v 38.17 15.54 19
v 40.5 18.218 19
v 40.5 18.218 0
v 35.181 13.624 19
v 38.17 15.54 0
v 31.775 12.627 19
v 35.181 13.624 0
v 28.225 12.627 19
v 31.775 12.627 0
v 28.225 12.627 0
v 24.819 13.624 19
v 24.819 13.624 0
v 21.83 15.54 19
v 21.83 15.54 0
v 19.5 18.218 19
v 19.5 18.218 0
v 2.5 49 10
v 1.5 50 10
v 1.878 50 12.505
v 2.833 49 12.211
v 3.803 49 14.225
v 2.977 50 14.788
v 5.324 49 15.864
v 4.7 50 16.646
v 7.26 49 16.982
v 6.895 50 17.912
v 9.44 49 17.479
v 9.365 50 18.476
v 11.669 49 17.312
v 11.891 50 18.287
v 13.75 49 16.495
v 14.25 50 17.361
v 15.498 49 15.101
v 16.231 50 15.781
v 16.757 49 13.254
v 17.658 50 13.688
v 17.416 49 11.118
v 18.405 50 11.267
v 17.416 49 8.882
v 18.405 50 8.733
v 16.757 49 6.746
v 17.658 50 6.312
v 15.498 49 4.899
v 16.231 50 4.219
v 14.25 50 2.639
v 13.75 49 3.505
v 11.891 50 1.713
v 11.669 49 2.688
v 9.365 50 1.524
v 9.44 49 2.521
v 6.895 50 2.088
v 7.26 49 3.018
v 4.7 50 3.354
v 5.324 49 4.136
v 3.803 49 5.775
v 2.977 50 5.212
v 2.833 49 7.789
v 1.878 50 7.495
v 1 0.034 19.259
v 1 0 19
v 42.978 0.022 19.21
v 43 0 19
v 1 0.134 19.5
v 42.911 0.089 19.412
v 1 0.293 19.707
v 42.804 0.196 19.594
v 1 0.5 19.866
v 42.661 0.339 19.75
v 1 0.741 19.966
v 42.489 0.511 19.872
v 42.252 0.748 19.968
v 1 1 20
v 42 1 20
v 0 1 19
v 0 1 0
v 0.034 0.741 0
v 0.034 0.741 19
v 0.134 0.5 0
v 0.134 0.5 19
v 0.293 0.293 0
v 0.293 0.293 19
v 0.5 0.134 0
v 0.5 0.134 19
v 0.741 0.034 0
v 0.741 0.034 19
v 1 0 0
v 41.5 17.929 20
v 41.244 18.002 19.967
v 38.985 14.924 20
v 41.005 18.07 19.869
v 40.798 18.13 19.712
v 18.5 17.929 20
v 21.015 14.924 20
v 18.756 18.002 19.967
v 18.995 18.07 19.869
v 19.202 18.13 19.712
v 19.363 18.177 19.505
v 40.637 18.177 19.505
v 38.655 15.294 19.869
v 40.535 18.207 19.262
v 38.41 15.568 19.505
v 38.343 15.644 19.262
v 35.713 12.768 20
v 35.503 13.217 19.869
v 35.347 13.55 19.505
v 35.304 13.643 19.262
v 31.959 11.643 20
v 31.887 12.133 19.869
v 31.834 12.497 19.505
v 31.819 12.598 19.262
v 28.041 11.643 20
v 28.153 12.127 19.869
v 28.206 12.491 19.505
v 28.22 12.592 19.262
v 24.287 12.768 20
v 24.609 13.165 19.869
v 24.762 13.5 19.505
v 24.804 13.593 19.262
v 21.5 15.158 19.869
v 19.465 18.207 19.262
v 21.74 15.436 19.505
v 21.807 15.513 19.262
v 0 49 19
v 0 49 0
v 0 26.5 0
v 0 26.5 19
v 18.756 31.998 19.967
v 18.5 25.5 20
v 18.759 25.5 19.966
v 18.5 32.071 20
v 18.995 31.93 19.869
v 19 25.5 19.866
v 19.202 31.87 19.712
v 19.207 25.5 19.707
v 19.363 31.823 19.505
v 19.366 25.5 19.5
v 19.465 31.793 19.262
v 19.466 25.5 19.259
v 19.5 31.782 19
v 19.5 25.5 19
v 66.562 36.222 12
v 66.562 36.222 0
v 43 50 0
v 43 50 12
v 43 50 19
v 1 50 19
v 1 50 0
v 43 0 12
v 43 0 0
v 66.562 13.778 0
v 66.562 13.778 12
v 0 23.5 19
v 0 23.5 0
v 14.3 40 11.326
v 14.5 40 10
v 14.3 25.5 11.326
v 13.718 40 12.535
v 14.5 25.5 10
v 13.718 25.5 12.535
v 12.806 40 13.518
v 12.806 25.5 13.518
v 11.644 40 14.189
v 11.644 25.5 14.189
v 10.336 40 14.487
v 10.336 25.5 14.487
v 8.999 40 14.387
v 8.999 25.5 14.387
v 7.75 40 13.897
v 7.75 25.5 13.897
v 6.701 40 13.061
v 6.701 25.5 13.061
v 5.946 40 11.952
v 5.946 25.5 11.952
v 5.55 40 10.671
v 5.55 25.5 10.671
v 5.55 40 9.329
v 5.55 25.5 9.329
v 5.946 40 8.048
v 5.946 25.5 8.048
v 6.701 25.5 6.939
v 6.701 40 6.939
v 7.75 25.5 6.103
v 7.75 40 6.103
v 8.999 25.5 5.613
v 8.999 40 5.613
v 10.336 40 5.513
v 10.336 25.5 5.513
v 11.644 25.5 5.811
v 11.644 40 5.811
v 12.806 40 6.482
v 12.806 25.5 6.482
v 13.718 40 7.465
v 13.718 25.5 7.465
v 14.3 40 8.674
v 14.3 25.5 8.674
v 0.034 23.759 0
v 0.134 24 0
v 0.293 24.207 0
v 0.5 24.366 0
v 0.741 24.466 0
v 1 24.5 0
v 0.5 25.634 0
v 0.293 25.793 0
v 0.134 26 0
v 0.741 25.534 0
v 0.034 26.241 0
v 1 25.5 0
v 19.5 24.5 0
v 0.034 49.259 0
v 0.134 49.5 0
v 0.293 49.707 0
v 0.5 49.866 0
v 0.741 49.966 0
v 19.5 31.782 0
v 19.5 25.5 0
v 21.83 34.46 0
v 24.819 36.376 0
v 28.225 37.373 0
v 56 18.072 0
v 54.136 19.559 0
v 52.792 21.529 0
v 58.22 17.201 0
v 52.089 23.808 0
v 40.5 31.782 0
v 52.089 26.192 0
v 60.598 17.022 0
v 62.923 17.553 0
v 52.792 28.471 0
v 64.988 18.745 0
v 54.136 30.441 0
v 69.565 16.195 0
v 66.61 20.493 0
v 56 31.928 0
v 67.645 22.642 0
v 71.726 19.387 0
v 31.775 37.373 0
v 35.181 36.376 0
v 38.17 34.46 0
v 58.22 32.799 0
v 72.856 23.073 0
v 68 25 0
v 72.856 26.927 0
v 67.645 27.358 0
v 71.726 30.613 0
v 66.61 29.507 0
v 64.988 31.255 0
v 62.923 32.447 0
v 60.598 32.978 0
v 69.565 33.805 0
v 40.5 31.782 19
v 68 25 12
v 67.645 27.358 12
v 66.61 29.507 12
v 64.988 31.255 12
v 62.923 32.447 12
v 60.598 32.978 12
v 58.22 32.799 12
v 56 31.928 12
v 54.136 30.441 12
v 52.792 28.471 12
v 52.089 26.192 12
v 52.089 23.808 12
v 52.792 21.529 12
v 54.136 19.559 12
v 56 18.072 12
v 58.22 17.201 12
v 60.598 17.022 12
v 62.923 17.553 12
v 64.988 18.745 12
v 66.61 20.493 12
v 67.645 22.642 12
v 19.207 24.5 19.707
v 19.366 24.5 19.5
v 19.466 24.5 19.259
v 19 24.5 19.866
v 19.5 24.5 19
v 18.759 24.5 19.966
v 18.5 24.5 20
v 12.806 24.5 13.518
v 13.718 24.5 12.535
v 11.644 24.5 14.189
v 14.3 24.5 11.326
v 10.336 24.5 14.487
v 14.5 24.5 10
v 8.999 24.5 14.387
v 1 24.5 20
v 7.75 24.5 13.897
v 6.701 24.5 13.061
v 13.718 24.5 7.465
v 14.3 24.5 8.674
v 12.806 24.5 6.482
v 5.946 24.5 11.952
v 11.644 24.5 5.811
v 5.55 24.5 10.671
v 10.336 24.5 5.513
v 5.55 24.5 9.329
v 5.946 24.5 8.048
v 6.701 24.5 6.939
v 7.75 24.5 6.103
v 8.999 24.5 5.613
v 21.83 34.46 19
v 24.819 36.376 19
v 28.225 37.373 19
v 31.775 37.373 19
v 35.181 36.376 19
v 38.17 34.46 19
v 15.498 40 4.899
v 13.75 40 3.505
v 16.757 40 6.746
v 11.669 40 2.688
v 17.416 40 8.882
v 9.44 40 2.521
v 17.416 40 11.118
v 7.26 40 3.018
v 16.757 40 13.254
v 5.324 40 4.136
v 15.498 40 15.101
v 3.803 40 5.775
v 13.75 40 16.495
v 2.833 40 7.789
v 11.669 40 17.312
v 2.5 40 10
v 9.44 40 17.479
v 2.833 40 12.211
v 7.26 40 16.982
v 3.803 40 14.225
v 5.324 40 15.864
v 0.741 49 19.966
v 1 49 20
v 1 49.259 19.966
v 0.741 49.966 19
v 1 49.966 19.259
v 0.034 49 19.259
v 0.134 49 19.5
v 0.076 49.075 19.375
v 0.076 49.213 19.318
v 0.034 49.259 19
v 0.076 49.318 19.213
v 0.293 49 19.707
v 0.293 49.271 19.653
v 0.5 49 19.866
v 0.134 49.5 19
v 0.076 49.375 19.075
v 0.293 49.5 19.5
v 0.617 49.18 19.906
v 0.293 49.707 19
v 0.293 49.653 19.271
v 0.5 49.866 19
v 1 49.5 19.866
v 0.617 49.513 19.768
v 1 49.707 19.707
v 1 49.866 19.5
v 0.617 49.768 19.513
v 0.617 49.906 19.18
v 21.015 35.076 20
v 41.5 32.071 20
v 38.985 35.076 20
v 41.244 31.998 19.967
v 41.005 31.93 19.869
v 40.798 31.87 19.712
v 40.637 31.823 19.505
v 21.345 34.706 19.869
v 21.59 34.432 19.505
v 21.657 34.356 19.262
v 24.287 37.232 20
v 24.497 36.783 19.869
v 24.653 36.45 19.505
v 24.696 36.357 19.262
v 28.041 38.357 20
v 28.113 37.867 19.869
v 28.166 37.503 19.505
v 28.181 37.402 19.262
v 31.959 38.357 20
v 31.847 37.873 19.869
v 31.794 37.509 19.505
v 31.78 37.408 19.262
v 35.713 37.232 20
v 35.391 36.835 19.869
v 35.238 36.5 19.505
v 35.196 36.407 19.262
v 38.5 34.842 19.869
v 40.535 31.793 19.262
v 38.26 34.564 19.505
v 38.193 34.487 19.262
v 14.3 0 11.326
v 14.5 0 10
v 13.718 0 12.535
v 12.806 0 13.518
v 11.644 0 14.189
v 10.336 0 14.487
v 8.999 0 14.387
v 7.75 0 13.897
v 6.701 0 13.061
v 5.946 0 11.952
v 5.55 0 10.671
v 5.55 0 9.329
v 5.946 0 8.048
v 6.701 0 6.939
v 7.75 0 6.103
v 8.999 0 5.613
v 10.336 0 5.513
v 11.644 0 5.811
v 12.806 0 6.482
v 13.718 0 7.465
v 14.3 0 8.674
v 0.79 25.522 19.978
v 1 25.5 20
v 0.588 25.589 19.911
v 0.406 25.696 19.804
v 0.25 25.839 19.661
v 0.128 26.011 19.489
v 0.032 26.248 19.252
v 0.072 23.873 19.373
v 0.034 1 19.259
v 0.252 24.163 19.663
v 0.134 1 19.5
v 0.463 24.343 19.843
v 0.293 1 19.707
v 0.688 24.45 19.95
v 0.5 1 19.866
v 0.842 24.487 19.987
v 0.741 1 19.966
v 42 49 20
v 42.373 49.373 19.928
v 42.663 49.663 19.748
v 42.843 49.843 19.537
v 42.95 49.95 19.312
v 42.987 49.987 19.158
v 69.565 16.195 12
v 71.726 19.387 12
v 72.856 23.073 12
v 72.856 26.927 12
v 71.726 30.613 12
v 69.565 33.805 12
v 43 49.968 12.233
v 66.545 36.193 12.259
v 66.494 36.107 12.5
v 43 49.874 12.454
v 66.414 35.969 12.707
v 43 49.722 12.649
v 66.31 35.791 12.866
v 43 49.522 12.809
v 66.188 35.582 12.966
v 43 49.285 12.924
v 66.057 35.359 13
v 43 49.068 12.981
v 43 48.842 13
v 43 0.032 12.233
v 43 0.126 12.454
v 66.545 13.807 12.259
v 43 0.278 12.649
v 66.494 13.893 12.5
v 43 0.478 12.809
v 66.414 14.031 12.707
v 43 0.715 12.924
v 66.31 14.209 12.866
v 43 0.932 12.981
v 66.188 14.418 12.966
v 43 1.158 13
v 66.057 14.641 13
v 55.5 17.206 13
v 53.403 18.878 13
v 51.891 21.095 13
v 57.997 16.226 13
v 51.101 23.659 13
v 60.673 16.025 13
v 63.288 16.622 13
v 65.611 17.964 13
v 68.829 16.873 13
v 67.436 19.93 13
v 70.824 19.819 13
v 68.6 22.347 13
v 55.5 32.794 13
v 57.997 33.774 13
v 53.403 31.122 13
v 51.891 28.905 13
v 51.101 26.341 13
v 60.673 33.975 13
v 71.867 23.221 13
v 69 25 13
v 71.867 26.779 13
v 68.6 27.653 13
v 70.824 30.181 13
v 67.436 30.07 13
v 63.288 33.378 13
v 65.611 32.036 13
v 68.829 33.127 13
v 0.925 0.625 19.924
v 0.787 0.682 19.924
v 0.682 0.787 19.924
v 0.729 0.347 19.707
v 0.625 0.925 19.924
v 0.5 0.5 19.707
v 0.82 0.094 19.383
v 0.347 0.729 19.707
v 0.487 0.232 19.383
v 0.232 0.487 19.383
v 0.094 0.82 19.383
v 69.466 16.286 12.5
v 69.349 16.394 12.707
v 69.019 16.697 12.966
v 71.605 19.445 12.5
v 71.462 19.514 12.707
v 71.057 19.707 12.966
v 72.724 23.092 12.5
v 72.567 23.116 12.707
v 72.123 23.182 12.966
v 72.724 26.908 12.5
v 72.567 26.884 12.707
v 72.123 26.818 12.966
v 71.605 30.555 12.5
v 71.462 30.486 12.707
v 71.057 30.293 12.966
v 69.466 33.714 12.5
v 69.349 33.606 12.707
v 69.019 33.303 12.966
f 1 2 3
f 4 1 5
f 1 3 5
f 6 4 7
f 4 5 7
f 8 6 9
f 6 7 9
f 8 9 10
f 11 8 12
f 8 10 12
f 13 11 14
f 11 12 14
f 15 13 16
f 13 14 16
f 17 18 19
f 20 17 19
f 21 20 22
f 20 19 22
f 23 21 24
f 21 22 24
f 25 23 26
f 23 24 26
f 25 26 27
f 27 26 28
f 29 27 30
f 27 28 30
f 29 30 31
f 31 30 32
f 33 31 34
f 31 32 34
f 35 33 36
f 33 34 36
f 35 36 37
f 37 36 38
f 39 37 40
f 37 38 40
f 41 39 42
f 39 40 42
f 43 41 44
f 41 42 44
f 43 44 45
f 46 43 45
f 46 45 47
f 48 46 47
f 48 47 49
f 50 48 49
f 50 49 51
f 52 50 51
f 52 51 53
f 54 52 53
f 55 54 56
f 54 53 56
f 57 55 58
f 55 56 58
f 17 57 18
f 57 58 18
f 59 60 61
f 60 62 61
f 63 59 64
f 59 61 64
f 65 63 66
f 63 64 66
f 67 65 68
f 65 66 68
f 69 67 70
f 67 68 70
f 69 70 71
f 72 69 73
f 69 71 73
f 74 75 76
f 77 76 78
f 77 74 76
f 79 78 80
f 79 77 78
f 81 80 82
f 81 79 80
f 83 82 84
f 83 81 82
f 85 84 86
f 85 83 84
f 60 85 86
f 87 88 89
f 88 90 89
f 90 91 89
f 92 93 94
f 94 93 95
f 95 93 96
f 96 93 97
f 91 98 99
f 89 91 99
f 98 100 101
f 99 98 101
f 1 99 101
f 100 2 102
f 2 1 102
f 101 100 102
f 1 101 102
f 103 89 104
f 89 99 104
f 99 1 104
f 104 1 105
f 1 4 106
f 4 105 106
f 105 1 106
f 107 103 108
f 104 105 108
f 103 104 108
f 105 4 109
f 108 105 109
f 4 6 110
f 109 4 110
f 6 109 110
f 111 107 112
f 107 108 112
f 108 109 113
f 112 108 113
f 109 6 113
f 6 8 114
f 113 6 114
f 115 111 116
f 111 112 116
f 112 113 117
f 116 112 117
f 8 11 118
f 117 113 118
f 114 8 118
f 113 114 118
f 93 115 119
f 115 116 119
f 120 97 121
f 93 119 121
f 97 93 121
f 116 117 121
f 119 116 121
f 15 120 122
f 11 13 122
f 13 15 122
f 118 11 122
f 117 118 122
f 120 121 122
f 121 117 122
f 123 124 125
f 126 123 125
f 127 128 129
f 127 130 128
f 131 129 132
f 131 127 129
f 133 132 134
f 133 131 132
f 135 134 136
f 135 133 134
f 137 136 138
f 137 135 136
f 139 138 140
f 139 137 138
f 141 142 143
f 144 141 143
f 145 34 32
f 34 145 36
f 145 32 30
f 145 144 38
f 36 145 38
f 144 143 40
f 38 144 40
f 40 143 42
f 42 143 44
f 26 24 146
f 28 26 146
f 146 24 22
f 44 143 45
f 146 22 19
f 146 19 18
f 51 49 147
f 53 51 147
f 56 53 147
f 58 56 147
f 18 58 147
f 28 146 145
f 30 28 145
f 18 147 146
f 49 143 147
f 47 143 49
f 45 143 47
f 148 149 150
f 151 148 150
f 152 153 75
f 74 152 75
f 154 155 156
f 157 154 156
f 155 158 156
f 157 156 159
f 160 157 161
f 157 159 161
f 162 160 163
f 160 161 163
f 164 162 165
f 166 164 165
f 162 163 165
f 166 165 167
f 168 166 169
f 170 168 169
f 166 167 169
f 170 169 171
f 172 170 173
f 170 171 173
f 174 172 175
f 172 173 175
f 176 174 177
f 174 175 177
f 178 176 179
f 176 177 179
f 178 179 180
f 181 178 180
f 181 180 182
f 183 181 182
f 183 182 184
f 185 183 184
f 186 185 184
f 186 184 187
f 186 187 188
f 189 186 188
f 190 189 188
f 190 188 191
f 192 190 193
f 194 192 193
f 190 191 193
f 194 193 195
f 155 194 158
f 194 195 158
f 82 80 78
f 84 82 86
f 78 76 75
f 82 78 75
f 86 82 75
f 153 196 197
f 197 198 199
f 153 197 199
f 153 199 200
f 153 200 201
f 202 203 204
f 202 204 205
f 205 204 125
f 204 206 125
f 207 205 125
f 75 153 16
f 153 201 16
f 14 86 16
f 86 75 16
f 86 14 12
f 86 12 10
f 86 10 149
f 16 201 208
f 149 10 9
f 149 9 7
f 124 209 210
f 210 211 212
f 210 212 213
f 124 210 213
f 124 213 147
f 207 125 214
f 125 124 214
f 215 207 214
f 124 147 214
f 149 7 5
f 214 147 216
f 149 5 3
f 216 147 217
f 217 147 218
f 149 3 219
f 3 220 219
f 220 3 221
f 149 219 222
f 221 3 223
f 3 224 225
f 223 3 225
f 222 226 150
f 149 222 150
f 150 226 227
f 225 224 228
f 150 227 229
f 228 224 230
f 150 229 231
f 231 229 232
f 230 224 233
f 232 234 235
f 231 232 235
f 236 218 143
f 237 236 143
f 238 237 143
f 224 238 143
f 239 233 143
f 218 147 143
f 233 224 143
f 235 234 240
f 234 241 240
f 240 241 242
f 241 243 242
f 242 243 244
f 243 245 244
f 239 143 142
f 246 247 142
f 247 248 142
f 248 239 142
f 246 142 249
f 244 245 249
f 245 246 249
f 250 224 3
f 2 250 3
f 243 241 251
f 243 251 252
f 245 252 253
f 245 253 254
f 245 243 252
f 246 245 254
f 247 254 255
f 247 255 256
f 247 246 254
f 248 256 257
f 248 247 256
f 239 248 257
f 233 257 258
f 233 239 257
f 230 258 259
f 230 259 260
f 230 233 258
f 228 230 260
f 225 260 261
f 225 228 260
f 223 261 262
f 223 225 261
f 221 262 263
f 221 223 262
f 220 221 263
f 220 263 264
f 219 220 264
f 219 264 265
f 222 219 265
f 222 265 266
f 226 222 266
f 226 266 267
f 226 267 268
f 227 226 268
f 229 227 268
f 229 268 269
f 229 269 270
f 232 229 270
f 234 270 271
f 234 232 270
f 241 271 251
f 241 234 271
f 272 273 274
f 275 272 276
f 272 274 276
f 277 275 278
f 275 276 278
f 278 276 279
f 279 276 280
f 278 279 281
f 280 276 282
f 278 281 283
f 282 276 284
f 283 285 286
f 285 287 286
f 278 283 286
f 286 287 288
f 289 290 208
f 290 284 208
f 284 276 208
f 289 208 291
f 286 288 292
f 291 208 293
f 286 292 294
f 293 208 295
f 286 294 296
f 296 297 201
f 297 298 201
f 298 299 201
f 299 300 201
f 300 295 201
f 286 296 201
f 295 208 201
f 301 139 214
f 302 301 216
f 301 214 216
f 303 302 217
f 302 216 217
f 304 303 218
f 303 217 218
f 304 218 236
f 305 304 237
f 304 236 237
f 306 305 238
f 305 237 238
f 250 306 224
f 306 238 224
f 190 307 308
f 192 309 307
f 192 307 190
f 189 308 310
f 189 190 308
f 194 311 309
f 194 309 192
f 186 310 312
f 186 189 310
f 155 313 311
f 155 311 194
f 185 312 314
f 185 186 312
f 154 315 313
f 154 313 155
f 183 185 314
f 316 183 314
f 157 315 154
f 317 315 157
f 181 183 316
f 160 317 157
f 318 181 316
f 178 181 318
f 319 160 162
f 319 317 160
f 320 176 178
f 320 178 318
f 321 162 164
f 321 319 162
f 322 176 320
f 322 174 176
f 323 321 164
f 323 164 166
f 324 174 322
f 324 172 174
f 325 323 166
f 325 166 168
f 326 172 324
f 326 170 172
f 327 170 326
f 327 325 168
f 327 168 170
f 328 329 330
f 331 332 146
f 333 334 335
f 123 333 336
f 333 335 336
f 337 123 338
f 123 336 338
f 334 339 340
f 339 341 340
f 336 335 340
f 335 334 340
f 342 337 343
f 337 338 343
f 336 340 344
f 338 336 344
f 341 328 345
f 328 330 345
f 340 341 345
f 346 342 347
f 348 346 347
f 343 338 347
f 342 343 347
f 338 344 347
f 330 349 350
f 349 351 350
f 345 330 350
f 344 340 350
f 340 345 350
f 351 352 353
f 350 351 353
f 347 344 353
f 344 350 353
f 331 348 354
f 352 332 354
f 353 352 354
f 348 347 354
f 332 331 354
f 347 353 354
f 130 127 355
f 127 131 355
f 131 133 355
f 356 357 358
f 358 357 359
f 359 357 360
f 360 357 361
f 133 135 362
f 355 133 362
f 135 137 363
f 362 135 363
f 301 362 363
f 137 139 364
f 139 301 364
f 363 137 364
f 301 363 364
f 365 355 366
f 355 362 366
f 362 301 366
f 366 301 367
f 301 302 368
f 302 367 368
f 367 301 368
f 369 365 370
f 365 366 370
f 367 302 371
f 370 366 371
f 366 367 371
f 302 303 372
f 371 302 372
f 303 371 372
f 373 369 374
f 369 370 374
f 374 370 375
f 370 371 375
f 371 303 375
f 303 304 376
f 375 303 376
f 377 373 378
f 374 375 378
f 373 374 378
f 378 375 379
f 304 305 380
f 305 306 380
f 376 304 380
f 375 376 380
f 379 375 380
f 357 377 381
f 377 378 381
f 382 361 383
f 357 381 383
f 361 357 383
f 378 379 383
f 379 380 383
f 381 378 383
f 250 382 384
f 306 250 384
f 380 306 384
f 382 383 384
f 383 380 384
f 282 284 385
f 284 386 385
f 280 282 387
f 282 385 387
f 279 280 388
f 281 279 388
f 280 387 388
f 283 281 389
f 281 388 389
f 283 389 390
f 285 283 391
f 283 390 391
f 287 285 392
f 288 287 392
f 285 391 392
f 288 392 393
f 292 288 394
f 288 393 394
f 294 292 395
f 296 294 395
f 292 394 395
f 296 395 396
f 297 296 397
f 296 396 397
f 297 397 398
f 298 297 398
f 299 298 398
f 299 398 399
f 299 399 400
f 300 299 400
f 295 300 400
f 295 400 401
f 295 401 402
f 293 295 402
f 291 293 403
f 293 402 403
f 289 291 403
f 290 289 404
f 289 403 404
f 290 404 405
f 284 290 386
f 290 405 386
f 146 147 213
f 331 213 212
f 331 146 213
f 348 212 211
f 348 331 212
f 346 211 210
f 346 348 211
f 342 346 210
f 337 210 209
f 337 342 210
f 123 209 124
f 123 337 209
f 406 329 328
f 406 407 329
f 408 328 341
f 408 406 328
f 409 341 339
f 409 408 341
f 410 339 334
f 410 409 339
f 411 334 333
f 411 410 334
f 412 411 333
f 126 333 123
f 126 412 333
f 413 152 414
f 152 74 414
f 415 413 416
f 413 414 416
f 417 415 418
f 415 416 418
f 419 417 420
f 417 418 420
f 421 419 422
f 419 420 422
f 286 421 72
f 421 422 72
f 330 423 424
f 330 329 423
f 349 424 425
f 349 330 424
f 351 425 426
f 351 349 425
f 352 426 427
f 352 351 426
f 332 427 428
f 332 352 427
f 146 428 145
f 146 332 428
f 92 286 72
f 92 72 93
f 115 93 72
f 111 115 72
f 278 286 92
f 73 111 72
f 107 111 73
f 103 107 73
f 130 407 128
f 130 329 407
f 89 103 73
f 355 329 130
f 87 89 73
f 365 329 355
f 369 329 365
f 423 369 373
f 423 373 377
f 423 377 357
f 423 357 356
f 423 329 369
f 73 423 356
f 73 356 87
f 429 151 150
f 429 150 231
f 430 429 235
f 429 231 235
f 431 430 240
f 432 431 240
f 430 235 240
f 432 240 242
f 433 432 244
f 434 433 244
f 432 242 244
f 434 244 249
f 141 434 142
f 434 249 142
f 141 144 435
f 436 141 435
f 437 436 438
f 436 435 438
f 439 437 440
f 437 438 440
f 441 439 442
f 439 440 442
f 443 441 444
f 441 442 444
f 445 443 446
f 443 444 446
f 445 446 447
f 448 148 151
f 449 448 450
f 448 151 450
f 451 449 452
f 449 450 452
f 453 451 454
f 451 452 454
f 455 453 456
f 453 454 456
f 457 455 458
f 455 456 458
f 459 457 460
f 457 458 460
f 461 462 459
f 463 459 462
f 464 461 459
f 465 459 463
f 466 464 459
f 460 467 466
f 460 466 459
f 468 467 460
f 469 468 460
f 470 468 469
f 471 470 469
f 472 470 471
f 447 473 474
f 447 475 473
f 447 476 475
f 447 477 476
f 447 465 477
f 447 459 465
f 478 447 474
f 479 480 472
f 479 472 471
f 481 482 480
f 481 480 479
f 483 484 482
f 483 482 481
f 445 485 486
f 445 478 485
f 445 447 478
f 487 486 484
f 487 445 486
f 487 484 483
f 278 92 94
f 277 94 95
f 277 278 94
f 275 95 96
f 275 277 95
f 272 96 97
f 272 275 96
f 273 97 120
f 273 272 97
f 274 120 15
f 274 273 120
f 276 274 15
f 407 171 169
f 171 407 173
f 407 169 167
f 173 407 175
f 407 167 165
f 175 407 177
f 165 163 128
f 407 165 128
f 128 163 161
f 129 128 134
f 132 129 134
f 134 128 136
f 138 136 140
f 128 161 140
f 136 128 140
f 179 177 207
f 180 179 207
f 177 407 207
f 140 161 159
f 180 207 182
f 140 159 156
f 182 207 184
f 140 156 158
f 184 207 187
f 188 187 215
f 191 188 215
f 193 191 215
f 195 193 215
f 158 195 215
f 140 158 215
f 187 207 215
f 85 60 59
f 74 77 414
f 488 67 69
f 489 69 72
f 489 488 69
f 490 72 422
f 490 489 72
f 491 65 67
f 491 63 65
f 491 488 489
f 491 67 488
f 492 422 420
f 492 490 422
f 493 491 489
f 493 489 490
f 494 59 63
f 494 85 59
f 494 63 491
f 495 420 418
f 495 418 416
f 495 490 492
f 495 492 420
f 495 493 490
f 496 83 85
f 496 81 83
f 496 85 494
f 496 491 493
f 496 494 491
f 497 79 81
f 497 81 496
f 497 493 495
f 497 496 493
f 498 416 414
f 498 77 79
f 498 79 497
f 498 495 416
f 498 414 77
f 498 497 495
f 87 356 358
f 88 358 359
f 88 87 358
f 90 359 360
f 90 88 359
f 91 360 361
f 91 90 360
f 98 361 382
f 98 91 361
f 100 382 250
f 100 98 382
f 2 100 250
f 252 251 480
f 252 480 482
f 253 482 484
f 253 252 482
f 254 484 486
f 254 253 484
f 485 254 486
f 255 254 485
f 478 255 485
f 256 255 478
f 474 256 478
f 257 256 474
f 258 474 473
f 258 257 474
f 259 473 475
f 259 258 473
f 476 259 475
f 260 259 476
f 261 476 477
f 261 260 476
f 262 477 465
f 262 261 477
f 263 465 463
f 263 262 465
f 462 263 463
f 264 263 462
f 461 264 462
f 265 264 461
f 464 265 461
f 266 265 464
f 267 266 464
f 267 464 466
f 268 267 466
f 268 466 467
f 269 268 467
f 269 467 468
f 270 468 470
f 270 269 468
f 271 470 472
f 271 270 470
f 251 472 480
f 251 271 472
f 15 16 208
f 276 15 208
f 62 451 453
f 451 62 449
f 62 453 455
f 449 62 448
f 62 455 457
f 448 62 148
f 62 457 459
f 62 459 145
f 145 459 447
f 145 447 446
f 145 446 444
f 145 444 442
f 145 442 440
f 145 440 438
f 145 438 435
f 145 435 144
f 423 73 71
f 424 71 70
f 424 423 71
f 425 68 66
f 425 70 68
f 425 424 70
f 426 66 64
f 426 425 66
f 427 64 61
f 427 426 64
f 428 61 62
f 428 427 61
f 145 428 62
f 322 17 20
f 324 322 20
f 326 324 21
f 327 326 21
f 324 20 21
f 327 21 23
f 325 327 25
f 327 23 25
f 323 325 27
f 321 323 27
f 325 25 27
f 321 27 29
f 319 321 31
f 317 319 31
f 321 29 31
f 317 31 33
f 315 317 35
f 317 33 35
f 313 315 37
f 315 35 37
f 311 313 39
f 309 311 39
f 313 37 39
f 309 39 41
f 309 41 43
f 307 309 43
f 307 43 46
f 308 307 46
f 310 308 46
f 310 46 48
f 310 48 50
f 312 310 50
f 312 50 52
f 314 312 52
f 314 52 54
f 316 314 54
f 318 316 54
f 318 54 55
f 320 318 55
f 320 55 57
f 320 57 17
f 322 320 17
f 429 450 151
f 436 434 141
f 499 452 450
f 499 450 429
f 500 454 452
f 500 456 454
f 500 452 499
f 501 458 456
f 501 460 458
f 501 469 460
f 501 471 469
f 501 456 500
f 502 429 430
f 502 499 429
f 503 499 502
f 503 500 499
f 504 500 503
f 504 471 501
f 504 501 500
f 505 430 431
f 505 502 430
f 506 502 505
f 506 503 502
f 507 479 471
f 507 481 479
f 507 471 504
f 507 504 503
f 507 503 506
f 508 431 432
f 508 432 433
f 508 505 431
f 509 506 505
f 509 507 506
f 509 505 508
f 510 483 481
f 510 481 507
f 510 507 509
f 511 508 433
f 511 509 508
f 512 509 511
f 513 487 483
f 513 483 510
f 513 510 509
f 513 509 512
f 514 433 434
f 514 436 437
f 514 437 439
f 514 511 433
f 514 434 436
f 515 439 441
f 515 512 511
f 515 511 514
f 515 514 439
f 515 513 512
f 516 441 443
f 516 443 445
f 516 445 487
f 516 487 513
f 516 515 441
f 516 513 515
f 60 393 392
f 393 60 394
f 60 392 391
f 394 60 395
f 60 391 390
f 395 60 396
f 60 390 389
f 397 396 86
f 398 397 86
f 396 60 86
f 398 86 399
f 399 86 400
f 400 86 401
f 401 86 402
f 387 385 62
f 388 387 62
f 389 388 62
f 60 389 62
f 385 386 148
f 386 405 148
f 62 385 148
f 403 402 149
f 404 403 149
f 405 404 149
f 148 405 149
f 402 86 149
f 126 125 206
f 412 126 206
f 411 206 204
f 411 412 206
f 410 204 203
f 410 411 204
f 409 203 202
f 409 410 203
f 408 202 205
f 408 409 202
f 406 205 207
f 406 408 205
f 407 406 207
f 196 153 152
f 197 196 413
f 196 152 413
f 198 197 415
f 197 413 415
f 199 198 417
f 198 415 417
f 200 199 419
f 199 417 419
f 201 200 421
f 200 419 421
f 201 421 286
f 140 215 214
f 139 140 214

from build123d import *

# Parameters (mm, degrees)
F0_R           = 8
F1_DEPTH       = 13
F2_DEPTH       = 20
F4_D           = 9
F4_CBORE_D     = 15
F4_CBORE_DEPTH = 10
F5_R           = 1
F6_SIZE2       = 1
F6_SIZE        = 1


with BuildPart() as f1:
    # F0 (on Top) → F1 (new body)
    with BuildSketch(Plane.XY):
        with BuildLine():
            Line((43, 50), (43, 0))
            Line((43, 0), (66.5621155816, 13.7777614045))
            ThreePointArc((66.5621155816, 13.7777614045), (73, 25), (66.5621155816, 36.2222385955))
            Line((66.5621155816, 36.2222385955), (43, 50))
        make_face()
        with Locations((60, 25)):
            Circle(F0_R, mode=Mode.SUBTRACT)
    extrude(amount=F1_DEPTH)

    # F0 (on Top) → F2 (join)
    with BuildSketch(Plane.XY):
        with BuildLine():
            Line((0, 24.5), (0, 0))
            Line((0, 0), (43, 0))
            Line((43, 0), (43, 50))
            Line((43, 50), (0, 50))
            Line((0, 50), (0, 25.5))
            Line((0, 25.5), (19.5, 25.5))
            Line((19.5, 25.5), (19.5, 31.7823299831))
            ThreePointArc((19.5, 31.7823299831), (30, 37.5), (40.5, 31.7823299831))
            Line((40.5, 31.7823299831), (40.5, 18.2176700169))
            ThreePointArc((40.5, 18.2176700169), (30, 12.5), (19.5, 18.2176700169))
            Line((19.5, 18.2176700169), (19.5, 24.5))
            Line((19.5, 24.5), (0, 24.5))
        make_face()
    extrude(amount=F2_DEPTH)

    # F4 (through all)
    with Locations(Plane(origin=(0, 50, 0), x_dir=(-1, 0, 0), z_dir=(0, 1, 0))):
        with Locations((-10, 10)):
            CounterBoreHole(F4_D / 2, F4_CBORE_D / 2, F4_CBORE_DEPTH)

    # F5
    f5_edges = [f1.edges().sort_by_distance(p)[0] for p in [
        (0, 0, 10),
        (21.5, 50, 20),
        (0, 37.75, 20),
        (21.5, 0, 20),
        (43, 25, 20),
        (30, 37.5, 20),
        (30, 12.5, 20),
        (40.5, 25, 20),
        (19.5, 21.358835, 20),
        (19.5, 28.641165, 20),
        (0, 25.5, 10),
        (54.781058, 6.888881, 13),
        (0, 12.25, 20),
        (0, 24.5, 10),
        (0, 50, 10),
        (54.781058, 43.111119, 13),
        (73, 25, 13),
    ]]
    fillet(f5_edges, radius=F5_R)

    # F6
    f6_edges = [f1.edges().sort_by_distance(p)[0] for p in [
        (52, 25, 13),
        (17.5, 50, 10),
    ]]
    chamfer(f6_edges, length=F6_SIZE, length2=F6_SIZE2)


solid = f1.part
